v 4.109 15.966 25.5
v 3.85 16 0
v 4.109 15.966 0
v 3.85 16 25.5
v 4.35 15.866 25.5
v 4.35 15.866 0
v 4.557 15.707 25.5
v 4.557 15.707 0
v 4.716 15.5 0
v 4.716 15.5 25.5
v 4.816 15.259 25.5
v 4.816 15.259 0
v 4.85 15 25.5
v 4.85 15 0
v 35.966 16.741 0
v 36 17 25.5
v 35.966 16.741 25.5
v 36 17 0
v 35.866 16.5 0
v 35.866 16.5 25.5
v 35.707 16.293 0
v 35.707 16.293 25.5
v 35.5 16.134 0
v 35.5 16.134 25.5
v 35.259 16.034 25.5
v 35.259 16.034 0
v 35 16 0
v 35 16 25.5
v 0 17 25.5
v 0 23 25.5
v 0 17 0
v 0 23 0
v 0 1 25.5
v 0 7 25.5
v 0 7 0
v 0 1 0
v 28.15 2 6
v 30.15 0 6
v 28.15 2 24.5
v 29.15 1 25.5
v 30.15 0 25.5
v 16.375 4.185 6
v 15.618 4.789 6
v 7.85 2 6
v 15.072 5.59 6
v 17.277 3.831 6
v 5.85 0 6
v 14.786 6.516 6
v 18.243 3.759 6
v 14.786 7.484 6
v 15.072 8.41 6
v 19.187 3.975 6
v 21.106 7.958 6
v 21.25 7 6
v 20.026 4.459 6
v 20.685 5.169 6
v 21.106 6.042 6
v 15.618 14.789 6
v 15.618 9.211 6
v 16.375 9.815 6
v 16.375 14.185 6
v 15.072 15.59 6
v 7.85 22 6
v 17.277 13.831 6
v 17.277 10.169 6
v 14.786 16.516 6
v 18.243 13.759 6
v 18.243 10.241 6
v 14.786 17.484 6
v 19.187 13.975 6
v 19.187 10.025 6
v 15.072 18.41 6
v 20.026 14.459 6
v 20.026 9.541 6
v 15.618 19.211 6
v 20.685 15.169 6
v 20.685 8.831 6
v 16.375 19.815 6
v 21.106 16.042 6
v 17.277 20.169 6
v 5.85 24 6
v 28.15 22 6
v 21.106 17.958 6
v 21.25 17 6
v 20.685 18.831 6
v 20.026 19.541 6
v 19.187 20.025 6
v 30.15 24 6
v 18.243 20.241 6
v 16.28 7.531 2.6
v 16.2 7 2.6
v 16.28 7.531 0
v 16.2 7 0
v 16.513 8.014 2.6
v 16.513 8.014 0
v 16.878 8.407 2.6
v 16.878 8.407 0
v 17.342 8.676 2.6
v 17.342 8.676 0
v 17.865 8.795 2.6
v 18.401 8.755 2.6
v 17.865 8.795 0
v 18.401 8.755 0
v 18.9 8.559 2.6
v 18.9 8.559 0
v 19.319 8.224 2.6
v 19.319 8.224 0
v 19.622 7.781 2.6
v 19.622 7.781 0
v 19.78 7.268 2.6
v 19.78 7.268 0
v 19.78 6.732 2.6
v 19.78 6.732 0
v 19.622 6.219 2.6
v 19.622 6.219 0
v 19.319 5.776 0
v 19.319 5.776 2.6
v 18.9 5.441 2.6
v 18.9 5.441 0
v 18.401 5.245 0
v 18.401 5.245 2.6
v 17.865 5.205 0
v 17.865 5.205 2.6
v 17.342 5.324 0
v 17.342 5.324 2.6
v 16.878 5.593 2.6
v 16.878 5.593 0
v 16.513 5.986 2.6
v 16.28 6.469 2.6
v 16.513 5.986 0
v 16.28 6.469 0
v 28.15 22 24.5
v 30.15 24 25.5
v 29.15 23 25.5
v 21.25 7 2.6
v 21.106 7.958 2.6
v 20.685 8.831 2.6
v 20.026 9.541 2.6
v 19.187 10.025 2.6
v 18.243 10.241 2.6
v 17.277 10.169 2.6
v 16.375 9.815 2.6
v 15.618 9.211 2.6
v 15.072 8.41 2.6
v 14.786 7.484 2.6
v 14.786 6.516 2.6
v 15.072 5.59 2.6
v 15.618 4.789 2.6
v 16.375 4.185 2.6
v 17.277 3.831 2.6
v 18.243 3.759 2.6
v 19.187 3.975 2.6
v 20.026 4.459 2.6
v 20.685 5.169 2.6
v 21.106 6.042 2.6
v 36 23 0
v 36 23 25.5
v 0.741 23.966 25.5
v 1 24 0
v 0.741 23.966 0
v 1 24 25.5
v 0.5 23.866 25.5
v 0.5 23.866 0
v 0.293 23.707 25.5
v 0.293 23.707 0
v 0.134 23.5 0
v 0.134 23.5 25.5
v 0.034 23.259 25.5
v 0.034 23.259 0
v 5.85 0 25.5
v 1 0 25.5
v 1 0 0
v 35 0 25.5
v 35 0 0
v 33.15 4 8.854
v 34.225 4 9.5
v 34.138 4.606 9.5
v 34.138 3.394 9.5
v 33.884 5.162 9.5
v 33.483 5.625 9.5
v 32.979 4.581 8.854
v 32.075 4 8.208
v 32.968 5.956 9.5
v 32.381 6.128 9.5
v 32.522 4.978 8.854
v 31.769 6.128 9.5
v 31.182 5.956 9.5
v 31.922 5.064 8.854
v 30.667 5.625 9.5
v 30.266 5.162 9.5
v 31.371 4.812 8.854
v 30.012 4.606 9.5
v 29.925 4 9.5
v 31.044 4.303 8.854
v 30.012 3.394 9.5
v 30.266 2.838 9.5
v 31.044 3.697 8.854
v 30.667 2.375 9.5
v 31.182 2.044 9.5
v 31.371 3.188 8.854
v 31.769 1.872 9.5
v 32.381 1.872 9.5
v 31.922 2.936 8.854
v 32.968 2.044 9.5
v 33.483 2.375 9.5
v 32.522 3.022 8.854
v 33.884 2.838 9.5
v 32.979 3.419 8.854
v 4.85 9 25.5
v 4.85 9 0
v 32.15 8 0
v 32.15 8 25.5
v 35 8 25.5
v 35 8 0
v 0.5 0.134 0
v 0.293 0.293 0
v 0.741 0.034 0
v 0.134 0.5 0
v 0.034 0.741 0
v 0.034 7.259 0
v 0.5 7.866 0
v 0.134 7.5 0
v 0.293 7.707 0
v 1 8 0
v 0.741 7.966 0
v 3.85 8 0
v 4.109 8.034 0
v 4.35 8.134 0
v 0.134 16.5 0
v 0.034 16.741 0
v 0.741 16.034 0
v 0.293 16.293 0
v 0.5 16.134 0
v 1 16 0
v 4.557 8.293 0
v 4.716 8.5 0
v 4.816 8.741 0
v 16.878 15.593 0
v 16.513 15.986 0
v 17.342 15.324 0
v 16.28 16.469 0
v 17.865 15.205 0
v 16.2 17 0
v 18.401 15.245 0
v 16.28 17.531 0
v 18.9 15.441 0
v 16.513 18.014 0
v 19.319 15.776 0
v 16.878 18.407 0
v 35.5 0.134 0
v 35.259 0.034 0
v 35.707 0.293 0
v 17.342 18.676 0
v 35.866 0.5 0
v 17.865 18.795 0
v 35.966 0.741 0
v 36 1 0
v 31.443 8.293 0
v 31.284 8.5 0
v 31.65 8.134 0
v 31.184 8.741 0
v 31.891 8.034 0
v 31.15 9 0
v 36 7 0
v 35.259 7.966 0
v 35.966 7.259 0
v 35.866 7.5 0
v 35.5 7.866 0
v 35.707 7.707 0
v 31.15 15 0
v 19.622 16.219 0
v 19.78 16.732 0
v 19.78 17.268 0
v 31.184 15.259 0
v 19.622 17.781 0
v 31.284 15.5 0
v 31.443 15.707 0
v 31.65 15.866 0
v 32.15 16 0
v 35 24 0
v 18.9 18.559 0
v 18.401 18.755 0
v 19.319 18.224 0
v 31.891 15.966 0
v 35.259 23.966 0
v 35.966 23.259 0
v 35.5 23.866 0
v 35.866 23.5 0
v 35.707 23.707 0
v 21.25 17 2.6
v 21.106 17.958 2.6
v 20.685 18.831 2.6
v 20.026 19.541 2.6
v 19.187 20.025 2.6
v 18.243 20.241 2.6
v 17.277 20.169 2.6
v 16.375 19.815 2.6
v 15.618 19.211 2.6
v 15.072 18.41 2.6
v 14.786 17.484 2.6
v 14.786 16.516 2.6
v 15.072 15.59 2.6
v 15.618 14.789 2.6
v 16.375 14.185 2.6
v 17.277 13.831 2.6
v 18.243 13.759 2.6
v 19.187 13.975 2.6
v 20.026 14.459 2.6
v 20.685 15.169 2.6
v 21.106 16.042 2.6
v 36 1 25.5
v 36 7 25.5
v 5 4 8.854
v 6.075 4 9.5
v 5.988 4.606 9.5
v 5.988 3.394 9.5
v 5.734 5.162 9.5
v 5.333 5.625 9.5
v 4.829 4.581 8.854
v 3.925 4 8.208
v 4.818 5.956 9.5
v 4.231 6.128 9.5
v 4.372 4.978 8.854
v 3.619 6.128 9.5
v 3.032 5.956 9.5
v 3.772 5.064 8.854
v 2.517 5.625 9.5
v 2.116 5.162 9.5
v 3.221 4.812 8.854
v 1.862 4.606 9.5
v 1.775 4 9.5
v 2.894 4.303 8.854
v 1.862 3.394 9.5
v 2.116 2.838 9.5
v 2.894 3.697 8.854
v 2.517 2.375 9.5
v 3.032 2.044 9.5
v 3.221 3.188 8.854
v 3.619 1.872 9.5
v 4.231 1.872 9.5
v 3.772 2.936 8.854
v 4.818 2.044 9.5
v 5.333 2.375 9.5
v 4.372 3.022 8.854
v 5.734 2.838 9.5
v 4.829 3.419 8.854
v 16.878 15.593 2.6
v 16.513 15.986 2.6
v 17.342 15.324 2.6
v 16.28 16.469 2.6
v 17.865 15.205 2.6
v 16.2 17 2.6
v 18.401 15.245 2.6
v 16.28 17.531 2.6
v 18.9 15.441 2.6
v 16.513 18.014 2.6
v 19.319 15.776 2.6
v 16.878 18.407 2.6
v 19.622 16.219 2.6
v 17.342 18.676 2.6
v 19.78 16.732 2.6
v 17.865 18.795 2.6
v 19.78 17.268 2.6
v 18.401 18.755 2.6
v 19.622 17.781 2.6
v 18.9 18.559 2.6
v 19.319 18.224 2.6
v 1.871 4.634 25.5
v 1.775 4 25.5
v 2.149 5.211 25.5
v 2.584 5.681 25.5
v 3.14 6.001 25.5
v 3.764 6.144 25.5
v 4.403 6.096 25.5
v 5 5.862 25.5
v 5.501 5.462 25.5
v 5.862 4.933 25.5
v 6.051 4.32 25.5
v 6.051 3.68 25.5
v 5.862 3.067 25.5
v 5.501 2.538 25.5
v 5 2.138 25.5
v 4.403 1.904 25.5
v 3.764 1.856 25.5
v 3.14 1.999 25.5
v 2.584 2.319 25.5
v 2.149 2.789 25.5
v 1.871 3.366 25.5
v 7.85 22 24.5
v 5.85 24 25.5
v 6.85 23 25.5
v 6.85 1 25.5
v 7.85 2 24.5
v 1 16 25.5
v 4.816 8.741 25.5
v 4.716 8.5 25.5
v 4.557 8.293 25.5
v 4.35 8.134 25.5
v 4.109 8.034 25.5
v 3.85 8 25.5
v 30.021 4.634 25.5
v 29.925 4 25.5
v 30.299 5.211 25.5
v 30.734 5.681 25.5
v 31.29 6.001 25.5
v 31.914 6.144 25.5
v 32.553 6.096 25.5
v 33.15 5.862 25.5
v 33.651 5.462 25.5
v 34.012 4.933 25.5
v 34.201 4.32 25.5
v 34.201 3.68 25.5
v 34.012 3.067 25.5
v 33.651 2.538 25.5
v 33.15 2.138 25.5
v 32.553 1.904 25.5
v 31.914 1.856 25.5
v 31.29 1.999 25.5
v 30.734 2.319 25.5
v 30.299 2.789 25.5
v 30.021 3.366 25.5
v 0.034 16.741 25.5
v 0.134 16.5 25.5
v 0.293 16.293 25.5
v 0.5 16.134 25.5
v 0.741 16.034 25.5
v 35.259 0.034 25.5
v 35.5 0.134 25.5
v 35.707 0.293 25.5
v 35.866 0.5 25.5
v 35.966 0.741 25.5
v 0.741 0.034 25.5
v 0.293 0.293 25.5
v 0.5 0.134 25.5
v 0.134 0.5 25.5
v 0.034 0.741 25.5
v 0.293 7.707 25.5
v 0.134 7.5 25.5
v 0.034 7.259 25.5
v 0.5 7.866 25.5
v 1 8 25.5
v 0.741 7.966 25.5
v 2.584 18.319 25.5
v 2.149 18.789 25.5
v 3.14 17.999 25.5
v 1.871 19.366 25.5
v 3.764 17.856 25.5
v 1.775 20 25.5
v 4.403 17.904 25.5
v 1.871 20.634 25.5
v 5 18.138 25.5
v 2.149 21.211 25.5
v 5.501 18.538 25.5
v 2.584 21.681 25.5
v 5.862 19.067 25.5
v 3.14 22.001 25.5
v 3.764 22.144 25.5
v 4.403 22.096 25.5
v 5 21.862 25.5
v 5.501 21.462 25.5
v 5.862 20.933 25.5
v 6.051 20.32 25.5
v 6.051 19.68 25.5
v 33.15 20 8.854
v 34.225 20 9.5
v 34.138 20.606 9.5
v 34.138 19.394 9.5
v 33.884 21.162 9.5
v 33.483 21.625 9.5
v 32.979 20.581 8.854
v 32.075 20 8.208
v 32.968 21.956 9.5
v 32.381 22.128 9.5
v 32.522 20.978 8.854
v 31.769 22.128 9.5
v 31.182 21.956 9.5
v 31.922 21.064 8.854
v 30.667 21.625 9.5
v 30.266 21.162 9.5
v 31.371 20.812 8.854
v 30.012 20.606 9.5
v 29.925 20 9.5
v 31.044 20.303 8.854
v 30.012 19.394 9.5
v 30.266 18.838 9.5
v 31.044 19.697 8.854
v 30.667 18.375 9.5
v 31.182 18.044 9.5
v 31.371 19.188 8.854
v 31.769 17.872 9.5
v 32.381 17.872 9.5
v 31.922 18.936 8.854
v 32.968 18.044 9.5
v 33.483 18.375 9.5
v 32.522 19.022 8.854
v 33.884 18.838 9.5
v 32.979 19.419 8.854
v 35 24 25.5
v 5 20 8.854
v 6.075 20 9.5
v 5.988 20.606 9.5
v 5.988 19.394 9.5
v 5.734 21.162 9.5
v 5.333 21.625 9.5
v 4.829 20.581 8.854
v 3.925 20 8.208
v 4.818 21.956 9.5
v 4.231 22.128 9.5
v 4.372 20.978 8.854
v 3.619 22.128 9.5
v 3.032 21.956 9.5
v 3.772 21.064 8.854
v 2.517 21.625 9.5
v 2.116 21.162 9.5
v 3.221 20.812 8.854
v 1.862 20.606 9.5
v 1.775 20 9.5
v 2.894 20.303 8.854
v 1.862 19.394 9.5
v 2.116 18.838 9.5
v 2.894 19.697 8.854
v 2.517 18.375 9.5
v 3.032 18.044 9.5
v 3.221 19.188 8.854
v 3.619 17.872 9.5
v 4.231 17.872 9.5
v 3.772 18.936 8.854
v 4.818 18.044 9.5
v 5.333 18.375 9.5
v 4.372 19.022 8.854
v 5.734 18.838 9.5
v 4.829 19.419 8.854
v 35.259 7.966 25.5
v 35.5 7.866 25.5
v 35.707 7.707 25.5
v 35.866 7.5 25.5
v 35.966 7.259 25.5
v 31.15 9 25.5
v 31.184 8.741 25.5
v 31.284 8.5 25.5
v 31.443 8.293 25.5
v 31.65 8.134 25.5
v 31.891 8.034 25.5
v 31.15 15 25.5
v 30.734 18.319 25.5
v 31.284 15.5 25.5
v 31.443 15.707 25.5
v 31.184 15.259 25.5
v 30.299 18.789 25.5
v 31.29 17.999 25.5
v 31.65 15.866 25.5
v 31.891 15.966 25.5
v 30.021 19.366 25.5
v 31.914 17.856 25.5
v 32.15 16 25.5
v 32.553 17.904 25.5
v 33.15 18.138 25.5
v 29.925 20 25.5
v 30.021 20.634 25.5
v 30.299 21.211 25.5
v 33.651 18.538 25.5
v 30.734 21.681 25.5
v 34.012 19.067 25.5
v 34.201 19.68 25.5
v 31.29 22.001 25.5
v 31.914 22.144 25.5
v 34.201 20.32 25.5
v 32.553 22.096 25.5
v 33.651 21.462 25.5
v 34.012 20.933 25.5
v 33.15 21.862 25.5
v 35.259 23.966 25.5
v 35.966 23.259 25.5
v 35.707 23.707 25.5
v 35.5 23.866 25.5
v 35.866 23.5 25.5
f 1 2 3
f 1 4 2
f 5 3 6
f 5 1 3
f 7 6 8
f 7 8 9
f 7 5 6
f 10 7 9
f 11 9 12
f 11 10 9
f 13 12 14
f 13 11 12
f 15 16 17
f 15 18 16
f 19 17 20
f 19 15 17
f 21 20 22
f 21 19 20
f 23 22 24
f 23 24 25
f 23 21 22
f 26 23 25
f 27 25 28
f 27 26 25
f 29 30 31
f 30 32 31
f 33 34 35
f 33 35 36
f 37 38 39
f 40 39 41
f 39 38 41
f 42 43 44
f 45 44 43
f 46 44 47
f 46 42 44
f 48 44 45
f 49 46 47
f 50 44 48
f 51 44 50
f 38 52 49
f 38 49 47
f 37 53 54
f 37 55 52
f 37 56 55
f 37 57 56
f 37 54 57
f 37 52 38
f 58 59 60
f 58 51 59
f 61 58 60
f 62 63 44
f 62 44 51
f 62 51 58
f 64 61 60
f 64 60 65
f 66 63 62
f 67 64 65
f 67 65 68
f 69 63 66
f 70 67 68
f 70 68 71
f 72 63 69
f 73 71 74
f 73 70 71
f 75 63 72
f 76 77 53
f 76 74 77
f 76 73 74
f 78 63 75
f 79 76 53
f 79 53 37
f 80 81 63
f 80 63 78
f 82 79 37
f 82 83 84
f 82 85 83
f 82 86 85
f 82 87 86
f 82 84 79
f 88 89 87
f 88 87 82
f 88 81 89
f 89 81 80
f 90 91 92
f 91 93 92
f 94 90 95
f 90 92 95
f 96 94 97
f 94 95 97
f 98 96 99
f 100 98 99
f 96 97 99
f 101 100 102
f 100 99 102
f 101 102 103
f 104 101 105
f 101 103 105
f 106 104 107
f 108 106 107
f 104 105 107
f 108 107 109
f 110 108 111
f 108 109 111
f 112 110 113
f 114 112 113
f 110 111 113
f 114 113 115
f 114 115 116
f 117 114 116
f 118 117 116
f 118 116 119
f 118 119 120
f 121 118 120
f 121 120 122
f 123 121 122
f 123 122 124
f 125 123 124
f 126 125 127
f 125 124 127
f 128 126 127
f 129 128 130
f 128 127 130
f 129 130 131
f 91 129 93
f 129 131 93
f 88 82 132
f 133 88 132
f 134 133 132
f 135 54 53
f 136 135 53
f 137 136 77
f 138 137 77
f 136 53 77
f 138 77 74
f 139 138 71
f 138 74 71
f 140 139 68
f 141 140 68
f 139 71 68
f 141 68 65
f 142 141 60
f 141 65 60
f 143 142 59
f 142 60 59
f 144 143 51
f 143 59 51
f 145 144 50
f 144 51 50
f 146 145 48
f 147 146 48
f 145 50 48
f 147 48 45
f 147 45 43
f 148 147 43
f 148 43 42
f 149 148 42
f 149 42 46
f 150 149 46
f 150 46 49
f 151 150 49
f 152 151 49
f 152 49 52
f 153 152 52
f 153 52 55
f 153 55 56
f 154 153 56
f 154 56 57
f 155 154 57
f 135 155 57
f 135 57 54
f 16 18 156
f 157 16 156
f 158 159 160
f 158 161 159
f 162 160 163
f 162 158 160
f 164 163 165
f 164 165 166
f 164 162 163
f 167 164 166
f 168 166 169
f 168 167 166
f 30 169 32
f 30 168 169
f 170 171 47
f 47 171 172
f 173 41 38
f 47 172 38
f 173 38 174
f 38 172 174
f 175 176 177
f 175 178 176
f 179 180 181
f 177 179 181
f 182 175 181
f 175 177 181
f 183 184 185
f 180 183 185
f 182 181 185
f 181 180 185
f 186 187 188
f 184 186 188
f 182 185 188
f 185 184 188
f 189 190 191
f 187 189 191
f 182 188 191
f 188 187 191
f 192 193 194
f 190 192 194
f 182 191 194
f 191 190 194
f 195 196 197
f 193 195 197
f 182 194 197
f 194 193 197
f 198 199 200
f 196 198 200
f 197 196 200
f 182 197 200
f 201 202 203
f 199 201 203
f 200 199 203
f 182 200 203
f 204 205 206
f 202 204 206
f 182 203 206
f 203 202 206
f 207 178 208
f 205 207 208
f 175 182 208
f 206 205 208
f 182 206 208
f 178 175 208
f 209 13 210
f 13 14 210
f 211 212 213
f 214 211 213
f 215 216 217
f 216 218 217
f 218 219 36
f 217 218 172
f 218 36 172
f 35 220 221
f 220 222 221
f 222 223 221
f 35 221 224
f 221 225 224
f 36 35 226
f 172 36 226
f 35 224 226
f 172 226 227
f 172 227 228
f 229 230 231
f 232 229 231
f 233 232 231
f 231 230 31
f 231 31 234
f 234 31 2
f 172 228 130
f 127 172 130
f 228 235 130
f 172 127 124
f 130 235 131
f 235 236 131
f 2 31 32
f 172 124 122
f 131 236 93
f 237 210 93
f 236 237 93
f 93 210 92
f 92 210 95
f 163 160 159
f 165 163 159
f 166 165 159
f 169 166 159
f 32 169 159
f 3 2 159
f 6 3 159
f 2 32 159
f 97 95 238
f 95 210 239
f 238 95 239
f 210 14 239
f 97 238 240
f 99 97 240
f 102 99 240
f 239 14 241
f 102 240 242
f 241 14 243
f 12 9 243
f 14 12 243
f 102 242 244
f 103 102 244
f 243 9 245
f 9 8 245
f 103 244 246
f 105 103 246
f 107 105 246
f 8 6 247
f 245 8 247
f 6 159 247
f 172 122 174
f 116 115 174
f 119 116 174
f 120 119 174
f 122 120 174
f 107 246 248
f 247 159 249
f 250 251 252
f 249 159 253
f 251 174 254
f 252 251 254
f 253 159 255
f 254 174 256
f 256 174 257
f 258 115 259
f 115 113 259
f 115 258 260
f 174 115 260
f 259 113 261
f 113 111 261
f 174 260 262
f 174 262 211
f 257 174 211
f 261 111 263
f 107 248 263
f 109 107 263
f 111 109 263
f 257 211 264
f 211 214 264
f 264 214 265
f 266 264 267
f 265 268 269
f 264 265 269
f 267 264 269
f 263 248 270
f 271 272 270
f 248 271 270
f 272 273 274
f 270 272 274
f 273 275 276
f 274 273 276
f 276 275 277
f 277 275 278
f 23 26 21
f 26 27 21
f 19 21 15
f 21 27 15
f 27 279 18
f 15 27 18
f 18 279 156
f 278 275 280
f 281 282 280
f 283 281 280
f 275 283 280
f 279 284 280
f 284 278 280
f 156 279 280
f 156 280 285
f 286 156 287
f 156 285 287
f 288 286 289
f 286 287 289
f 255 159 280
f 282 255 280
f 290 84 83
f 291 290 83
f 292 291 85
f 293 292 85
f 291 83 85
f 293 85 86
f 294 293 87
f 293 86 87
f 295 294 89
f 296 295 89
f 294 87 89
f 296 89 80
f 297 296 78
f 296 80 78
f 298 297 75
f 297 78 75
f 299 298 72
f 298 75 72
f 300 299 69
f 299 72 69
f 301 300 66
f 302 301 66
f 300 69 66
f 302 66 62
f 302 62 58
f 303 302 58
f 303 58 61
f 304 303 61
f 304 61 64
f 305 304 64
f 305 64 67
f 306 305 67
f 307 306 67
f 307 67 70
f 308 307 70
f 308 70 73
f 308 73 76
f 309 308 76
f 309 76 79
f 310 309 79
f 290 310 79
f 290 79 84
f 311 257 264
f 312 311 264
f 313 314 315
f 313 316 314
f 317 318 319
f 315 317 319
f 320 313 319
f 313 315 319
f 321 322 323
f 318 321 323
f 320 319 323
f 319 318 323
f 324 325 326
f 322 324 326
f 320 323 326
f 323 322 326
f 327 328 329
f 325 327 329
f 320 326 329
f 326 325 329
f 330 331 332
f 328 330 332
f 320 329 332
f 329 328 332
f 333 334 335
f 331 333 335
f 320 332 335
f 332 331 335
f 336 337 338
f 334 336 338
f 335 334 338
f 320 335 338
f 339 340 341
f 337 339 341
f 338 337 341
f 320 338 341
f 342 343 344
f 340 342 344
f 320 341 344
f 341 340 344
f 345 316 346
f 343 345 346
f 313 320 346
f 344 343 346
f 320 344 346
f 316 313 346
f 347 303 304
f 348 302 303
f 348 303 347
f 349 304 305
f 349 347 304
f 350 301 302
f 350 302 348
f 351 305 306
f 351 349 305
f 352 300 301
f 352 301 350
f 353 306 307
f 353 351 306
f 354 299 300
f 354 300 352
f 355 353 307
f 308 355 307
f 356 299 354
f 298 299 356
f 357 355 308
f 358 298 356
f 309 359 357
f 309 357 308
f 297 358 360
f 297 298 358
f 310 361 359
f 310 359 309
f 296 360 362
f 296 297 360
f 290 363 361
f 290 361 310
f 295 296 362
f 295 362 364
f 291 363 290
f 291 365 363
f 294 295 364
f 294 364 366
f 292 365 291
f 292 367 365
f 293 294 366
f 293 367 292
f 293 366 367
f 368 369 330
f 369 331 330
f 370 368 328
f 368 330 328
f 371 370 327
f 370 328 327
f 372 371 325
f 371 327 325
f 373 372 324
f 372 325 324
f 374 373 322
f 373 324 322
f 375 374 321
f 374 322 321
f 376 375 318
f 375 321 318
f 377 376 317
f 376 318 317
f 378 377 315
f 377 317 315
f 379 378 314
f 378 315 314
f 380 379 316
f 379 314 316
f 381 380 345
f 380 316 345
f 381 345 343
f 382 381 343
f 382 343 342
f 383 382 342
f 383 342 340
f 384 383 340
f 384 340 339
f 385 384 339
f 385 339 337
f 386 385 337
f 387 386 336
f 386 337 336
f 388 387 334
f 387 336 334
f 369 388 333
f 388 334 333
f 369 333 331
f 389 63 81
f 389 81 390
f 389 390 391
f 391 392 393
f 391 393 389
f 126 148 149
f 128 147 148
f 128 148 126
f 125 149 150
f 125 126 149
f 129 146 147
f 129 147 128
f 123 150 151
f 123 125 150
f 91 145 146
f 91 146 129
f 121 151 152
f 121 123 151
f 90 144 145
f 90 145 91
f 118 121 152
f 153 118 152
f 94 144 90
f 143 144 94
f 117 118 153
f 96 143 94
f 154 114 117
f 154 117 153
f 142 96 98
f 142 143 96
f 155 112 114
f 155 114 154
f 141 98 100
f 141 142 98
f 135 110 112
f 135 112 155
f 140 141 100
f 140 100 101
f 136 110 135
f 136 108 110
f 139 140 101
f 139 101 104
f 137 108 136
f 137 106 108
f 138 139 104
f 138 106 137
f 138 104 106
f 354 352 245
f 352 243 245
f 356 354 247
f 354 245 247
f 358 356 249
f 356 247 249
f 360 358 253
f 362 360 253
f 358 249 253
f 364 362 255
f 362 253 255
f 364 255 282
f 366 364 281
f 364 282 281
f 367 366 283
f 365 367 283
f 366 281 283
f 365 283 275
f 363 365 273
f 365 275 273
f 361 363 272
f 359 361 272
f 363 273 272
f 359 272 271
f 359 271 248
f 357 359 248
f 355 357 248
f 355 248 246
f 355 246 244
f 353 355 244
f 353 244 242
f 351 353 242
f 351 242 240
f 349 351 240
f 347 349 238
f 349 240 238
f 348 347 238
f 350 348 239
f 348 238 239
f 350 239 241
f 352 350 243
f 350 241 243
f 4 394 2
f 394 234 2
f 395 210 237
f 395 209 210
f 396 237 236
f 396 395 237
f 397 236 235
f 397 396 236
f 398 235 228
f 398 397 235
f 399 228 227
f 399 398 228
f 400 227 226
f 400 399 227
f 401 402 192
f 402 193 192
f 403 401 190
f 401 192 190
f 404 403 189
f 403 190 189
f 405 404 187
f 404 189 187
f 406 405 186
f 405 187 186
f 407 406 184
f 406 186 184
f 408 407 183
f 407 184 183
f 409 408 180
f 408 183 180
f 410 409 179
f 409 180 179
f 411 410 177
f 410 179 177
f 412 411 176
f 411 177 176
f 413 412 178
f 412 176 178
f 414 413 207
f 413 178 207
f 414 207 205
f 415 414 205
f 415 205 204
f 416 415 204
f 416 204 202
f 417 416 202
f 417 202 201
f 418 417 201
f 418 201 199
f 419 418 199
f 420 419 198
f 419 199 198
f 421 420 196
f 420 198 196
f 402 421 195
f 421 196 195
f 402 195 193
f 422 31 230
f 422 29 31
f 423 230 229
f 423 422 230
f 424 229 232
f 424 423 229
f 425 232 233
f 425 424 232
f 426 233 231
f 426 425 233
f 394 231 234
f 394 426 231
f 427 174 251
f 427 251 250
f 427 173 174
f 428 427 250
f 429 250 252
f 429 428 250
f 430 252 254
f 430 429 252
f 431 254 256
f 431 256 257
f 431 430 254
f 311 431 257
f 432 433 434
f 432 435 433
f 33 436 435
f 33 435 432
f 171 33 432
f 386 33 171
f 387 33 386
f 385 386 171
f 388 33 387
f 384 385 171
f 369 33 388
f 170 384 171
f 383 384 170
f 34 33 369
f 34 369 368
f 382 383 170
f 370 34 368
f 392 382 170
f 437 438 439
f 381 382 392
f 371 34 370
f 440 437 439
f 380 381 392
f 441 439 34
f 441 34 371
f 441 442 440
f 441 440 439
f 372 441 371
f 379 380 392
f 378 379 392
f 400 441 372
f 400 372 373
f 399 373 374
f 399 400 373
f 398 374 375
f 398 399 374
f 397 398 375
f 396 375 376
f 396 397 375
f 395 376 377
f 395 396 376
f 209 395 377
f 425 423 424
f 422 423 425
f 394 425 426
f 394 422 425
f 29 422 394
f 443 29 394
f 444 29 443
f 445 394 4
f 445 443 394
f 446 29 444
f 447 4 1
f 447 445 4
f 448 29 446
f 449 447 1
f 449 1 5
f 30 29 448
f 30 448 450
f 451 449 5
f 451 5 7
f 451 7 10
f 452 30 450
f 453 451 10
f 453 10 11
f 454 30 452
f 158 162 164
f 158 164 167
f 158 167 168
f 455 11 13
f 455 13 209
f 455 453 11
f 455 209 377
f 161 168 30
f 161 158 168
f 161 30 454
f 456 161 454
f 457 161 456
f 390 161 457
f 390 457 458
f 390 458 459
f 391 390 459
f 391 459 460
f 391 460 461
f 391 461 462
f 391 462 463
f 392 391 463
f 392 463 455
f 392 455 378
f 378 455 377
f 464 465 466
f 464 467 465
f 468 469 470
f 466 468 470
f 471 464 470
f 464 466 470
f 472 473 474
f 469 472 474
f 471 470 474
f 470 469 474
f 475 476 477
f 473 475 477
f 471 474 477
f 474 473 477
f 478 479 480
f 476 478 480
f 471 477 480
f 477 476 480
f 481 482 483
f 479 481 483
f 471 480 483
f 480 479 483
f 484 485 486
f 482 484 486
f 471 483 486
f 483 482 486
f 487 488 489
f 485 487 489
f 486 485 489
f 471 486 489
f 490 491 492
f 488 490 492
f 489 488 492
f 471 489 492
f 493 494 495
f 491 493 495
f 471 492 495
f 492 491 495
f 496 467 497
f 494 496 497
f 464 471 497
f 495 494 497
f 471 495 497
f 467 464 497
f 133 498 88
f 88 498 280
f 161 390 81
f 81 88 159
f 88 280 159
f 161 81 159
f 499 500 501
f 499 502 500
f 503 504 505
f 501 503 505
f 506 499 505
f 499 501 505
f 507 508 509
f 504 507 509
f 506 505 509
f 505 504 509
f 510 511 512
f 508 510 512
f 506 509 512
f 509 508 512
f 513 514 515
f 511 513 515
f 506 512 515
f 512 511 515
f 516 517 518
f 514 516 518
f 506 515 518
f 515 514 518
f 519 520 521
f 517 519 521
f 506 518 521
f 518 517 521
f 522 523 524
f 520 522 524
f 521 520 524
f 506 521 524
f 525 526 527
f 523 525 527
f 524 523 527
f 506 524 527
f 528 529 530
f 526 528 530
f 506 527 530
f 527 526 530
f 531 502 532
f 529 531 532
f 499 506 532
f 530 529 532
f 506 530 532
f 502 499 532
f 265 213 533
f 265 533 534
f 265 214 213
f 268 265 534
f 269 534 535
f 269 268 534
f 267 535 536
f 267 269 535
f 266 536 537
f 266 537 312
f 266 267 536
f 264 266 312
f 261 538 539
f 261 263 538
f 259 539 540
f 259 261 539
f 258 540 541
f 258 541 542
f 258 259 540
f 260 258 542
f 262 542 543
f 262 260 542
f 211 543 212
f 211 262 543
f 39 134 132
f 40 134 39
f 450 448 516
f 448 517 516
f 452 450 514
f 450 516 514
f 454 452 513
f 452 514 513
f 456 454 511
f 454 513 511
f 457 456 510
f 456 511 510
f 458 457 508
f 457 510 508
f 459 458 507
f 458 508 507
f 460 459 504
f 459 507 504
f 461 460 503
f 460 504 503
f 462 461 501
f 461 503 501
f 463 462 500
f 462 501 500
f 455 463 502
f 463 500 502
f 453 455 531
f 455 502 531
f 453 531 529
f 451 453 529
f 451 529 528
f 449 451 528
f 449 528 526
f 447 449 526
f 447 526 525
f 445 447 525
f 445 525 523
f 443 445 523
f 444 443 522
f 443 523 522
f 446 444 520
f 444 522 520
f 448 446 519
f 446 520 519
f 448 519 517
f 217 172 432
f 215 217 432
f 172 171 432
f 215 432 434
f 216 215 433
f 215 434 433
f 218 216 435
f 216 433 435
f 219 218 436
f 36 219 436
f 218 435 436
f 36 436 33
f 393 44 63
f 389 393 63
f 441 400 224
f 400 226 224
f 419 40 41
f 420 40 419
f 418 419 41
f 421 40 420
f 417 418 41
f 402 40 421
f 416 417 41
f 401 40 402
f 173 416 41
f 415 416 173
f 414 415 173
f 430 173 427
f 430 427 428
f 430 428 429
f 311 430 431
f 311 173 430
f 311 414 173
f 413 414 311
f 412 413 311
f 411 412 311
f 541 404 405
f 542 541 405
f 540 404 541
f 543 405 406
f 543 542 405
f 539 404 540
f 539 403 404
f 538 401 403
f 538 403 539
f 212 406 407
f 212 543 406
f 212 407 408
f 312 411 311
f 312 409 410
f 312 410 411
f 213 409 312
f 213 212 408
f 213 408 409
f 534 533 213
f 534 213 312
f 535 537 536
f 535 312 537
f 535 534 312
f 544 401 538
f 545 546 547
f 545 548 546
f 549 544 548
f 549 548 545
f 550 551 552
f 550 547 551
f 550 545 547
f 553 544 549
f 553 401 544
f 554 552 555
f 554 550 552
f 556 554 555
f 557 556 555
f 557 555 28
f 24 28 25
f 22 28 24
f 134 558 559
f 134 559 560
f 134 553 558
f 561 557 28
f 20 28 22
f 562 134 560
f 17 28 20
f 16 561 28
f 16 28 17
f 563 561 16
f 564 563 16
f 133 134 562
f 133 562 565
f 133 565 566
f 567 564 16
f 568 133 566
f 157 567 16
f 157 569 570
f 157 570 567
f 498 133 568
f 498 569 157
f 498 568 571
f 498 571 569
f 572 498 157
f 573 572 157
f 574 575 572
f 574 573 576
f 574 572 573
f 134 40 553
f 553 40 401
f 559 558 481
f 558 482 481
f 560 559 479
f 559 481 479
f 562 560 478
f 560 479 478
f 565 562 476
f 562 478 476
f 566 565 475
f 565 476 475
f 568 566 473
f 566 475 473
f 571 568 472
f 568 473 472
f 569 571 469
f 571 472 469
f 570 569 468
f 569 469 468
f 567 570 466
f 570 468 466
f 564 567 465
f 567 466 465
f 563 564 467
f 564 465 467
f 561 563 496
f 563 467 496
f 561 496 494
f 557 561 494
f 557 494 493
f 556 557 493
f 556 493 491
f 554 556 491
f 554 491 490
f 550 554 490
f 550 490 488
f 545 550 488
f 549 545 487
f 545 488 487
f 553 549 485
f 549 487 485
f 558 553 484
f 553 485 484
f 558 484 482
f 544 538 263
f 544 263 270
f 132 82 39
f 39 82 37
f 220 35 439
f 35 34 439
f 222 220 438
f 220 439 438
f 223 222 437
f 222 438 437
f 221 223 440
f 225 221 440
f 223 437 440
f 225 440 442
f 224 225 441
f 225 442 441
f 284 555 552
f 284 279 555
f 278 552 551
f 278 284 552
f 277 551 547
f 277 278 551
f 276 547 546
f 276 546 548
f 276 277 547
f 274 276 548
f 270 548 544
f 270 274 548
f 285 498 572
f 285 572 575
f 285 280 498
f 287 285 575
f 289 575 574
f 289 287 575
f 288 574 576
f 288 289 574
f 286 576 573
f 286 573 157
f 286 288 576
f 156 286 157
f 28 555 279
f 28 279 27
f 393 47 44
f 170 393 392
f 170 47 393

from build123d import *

# Parameters (mm, degrees)
SKETCH1_W                                           = 36
SKETCH1_H                                           = 24
BOSS_EXTRUDE1_DEPTH                                 = 6
CBORE_FOR_M3_HEX_SOCKET_HEAD_CAP_SCREW1_D           = 3.6
CBORE_FOR_M3_HEX_SOCKET_HEAD_CAP_SCREW1_DEPTH       = 12
CBORE_FOR_M3_HEX_SOCKET_HEAD_CAP_SCREW1_CBORE_D     = 6.5
CBORE_FOR_M3_HEX_SOCKET_HEAD_CAP_SCREW1_CBORE_DEPTH = 3.4
CBORE_FOR_M3_HEX_SOCKET_HEAD_CAP_SCREW1_TIP         = 1.081549114
BOSS_EXTRUDE2_DEPTH                                 = 19.5
SKETCH5_W                                           = 4.85
SKETCH5_H                                           = 8
CUT_EXTRUDE1_DEPTH                                  = 48.457876059
F_4_3_4_3_DIAMETER_HOLE1_D                          = 4.3
F_4_3_4_3_DIAMETER_HOLE1_DEPTH                      = 16
F_4_3_4_3_DIAMETER_HOLE1_TIP                        = 1.291850331
FILLET1_R                                           = 1
CHAMFER1_SIZE                                       = 2
CHAMFER2_SIZE                                       = 1


with BuildPart() as part:
    # Sketch1 → Boss-Extrude1 (new body)
    with BuildSketch(Plane.XY):
        with Locations((18, 12)):
            Rectangle(SKETCH1_W, SKETCH1_H)
    extrude(amount=BOSS_EXTRUDE1_DEPTH)

    # CBORE for M3 Hex Socket Head Cap Screw1
    with Locations(Plane.XY.offset(6)):
        with Locations((18, 17), (18, 7)):
            CounterBoreHole(CBORE_FOR_M3_HEX_SOCKET_HEAD_CAP_SCREW1_D / 2, CBORE_FOR_M3_HEX_SOCKET_HEAD_CAP_SCREW1_CBORE_D / 2, CBORE_FOR_M3_HEX_SOCKET_HEAD_CAP_SCREW1_CBORE_DEPTH, depth=CBORE_FOR_M3_HEX_SOCKET_HEAD_CAP_SCREW1_DEPTH)
            with Locations((0, 0, -(CBORE_FOR_M3_HEX_SOCKET_HEAD_CAP_SCREW1_DEPTH + CBORE_FOR_M3_HEX_SOCKET_HEAD_CAP_SCREW1_TIP / 2))):  # 118° drill point
                Cone(0, CBORE_FOR_M3_HEX_SOCKET_HEAD_CAP_SCREW1_D / 2, CBORE_FOR_M3_HEX_SOCKET_HEAD_CAP_SCREW1_TIP, mode=Mode.SUBTRACT)

    # Sketch4 → Boss-Extrude2 (add)
    with BuildSketch(Plane.XY.offset(6)):
        Polygon((7.85, 24), (0, 24), (0, 16), (4.85, 16), (4.85, 8), (0, 8), (0, 0), (7.85, 0), align=None)
        Polygon((36, 24), (28.15, 24), (28.15, 0), (36, 0), (36, 8), (31.15, 8), (31.15, 16), (36, 16), align=None)
    extrude(amount=BOSS_EXTRUDE2_DEPTH)

    # Sketch5 → Cut-Extrude1 (cut, through all)
    with BuildSketch(Plane.XY.offset(6)):
        with Locations((33.575, 12)):
            Rectangle(SKETCH5_W, SKETCH5_H)
        with Locations((2.425, 12)):
            Rectangle(SKETCH5_W, SKETCH5_H)
    extrude(amount=-CUT_EXTRUDE1_DEPTH, mode=Mode.SUBTRACT)

    # Ø4.3 (4.3) Diameter Hole1
    with Locations(Plane.XY.offset(25.5)):
        with Locations((3.925, 20), (3.925, 4), (32.075, 4), (32.075, 20)):
            Hole(F_4_3_4_3_DIAMETER_HOLE1_D / 2, depth=F_4_3_4_3_DIAMETER_HOLE1_DEPTH)
            with Locations((0, 0, -(F_4_3_4_3_DIAMETER_HOLE1_DEPTH + F_4_3_4_3_DIAMETER_HOLE1_TIP / 2))):  # 118° drill point
                Cone(0, F_4_3_4_3_DIAMETER_HOLE1_D / 2, F_4_3_4_3_DIAMETER_HOLE1_TIP, mode=Mode.SUBTRACT)

    # Fillet1
    fillet1_edges = [part.edges().sort_by_distance(p)[0] for p in [
        (0, 16, 12.75),
        (4.85, 16, 12.75),
        (4.85, 8, 12.75),
        (0, 8, 12.75),
        (36, 8, 12.75),
        (31.15, 8, 12.75),
        (31.15, 16, 12.75),
        (36, 16, 12.75),
        (0, 24, 12.75),
        (36, 24, 12.75),
        (36, 0, 12.75),
        (0, 0, 12.75),
    ]]
    fillet(fillet1_edges, radius=FILLET1_R)

    # Chamfer1
    chamfer1_edges = [part.edges().sort_by_distance(p)[0] for p in [
        (7.85, 0, 15.75),
        (7.85, 24, 15.75),
        (28.15, 24, 15.75),
        (28.15, 0, 15.75),
    ]]
    chamfer(chamfer1_edges, length=CHAMFER1_SIZE)

    # Chamfer2
    chamfer2_edges = [part.edges().sort_by_distance(p)[0] for p in [
        (28.15, 12, 25.5),
        (7.85, 12, 25.5),
    ]]
    chamfer(chamfer2_edges, length=CHAMFER2_SIZE)


solid = part.part
